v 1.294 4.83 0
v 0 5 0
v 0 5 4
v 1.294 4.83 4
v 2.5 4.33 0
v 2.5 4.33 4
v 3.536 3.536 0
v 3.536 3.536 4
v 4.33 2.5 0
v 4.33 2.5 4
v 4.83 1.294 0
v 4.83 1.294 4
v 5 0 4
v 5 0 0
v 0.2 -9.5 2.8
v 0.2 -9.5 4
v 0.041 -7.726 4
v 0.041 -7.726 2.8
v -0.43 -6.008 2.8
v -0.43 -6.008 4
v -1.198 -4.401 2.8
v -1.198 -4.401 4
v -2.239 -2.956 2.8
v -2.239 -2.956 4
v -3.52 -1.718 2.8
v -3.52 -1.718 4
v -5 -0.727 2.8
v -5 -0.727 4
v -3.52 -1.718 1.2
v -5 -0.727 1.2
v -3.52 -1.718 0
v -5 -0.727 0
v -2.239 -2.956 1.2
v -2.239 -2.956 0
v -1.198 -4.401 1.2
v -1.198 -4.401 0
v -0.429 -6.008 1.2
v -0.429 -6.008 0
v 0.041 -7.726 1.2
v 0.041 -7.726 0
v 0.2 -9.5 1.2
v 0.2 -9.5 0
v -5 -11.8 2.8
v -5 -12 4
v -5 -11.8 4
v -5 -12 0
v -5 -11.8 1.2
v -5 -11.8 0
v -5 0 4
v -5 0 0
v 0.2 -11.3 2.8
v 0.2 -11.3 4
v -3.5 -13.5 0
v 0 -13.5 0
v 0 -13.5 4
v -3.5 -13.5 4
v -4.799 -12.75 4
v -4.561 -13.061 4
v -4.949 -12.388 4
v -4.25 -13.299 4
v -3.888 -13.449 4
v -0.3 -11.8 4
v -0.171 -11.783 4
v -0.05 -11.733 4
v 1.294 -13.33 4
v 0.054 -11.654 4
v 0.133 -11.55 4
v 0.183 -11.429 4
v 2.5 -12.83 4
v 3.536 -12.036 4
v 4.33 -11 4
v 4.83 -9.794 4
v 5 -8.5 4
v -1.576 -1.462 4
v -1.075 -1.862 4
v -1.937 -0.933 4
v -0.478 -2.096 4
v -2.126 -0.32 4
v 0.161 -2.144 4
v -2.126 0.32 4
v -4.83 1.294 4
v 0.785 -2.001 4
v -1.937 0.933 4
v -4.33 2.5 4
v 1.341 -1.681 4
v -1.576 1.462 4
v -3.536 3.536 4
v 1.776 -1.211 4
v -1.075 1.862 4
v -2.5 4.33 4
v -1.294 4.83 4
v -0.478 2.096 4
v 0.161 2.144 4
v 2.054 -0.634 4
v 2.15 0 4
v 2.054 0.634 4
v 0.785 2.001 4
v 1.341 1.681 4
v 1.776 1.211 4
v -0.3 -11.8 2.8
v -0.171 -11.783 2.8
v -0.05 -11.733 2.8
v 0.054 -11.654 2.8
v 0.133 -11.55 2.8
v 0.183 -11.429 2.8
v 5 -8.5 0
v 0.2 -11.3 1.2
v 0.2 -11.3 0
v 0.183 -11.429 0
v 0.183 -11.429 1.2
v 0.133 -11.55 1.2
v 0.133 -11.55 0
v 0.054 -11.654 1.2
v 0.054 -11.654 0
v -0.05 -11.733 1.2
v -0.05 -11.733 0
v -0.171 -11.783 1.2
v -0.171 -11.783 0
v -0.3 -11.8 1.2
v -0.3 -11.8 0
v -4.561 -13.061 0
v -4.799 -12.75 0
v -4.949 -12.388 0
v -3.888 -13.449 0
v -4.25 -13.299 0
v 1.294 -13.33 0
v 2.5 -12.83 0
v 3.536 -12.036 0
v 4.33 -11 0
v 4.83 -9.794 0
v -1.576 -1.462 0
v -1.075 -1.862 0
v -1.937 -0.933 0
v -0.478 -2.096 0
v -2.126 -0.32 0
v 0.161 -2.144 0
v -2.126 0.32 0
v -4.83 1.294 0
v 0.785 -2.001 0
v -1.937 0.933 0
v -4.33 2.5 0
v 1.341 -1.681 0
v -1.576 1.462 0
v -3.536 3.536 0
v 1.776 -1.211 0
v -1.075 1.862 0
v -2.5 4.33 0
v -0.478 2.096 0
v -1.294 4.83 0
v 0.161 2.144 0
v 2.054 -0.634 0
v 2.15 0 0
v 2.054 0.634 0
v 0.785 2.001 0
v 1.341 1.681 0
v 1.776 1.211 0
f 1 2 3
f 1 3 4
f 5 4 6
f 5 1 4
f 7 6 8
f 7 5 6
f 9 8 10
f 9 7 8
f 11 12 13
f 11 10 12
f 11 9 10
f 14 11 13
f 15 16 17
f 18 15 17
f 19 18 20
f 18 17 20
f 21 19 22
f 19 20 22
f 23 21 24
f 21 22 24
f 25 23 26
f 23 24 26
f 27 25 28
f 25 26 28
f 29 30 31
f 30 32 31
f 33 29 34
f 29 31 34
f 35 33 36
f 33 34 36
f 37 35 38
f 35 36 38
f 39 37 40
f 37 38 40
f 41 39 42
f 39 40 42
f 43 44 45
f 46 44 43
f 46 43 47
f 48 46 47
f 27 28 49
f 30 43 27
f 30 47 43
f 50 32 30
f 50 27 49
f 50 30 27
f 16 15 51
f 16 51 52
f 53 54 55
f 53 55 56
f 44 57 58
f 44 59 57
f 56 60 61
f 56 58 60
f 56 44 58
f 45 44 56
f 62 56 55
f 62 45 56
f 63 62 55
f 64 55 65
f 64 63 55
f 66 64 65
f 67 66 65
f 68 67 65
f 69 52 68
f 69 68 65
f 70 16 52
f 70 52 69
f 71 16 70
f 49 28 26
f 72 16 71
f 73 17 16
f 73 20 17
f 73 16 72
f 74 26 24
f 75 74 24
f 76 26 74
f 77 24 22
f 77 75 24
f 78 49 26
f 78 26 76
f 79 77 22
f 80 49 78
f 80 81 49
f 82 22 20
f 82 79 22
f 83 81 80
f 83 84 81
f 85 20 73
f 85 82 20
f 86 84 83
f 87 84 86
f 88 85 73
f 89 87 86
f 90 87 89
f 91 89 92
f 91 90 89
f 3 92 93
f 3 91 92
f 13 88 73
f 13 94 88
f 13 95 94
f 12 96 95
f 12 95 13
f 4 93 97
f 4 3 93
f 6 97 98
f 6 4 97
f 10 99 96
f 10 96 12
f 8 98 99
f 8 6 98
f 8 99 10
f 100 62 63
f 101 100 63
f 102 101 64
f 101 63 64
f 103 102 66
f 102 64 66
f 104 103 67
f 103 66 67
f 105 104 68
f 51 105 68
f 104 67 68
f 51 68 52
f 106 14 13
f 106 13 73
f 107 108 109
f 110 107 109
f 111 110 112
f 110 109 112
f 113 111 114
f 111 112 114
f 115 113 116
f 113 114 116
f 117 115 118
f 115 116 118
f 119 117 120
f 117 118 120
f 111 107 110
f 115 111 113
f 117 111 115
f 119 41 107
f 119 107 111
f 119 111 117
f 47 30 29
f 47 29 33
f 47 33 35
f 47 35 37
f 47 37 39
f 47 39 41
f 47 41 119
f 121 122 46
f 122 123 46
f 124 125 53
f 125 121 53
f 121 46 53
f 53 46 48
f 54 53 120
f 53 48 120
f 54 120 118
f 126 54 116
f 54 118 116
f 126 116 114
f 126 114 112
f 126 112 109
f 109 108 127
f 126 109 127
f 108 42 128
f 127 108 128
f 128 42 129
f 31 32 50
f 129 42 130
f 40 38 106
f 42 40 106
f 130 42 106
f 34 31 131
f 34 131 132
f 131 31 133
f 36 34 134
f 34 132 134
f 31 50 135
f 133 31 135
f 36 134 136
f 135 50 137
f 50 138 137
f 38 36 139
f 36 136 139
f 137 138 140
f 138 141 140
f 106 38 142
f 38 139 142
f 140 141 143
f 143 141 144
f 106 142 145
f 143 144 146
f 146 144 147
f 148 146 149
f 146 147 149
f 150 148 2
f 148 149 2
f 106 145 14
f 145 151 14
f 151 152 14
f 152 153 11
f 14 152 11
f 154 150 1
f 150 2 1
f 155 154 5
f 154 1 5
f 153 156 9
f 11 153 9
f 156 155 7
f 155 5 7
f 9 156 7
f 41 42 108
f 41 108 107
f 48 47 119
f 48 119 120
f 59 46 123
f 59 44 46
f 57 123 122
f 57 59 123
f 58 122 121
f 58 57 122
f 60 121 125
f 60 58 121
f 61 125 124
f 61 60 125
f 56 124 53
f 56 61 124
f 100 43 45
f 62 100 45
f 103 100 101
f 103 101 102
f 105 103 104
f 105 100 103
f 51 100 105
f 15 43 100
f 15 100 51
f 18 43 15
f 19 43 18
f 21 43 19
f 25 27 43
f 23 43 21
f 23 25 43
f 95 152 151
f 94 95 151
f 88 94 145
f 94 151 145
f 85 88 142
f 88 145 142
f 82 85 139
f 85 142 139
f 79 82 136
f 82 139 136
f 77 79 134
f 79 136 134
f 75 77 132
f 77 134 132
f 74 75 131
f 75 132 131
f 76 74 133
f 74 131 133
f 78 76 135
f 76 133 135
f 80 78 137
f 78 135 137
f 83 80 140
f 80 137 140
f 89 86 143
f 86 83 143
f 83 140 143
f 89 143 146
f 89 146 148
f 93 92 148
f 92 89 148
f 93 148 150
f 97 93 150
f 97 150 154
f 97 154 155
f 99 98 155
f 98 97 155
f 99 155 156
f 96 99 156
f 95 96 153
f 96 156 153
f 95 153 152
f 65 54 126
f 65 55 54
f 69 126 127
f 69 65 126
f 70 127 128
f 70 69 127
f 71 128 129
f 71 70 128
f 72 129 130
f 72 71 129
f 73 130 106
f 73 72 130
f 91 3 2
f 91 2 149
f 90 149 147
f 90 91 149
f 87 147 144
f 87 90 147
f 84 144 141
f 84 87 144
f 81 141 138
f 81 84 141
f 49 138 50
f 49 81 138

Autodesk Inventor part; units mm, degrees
ref_plane "YZ Plane" through (0, 0, 0) normal (1, 0, 0) x (0, 1, 0)
ref_plane "XZ Plane" through (0, 0, 0) normal (0, 1, 0) x (-1, 0, 0)
ref_plane "XY Plane" through (0, 0, 0) normal (0, 0, 1) x (1, 0, 0)
sketch "Boceto39" plane through (0, 0, 0) normal (0, 0, 1) x (1, 0, 0)
  circle A0 centre (0, 0) radius 2.15
  line L0 (-5, 5) -> (0, 5)
  line L1 (5, 0) -> (5, -13.5)
  line L2 (5, -13.5) -> (-5, -13.5)
  line L3 (-5, -13.5) -> (-5, 5)
  arc A1 (5, 0) -> (0, 5) centre (0, 0) ccw
  dimension "d373" = 4.3
  dimension "d374" = 5
  dimension "d375" = 10
  dimension "d376" = 18.5
extrude "Extrusión13" add sketch "Boceto39" along normal blind 4
sketch "Boceto40" plane through (-5, -13.5, 0) normal (-1, 0, 0) x (0, 0, 1)
  line L0 (0, 0) -> (0, 18.5) construction
  line L1 (0, 0) -> (4, 0) construction
  line L2 (4, 18.5) -> (4, 0) construction
  line L3 (0, 18.5) -> (4, 18.5) construction
  line L4 (0, 4) -> (1.2, 4)
  line L5 (1.2, 4) -> (1.2, 1.7)
  line L6 (1.2, 1.7) -> (0, 1.7)
  line L7 (0, 1.7) -> (0, 4)
  line L8 (4, 18.5) -> (4, 0) projected
  line L9 (4, 4) -> (2.8, 4)
  line L10 (2.8, 4) -> (2.8, 1.7)
  line L11 (2.8, 1.7) -> (4, 1.7)
  line L12 (4, 1.7) -> (4, 4)
  point P0 (0, 13.5)
  dimension "d379" = 1.7
  dimension "d380" = 2.3
  dimension "d381" = 1.2
extrude "Extrusión14" cut sketch "Boceto40" against normal blind 5.2
sketch "Boceto41" plane through (0, 0, 0) normal (0, 0, -1) x (-1, 0, 0)
  line L0 (-0.2, -11.8) -> (-0.2, -9.5) construction
  line L1 (5, -9.5) -> (5, 5) construction
  arc A0 (5, -0.7273) -> (-0.2, -9.5) centre (9.8, -9.5) ccw
  line L2 (5, 5) -> (5, -9.5) construction
  line L3 (-0.2, -9.5) -> (5, -9.5)
  line L4 (5, -9.5) -> (5, -0.7273)
  point P0 (0, 0)
  dimension "d384" = 10
extrude "Extrusión15" cut sketch "Boceto41" against normal up to surface (1.2 mm away)
sketch "Boceto42" plane through (0, 0, 4) normal (0, 0, 1) x (1, 0, 0)
  line L0 (-5, -9.5) -> (0.2, -9.5) projected
  line L1 (0.2, -9.5) -> (0.2, -11.8) construction
  line L2 (0.2, -11.8) -> (-5, -11.8) construction
  line L3 (-5, -11.8) -> (-5, -13.5) construction
  line L4 (-5, -13.5) -> (5, -13.5) construction
  line L5 (5, -13.5) -> (5, 0) construction
  arc A0 (5, 0) -> (0, 5) centre (0, 0) ccw construction
  line L6 (0, 5) -> (-5, 5) construction
  line L7 (-5, 5) -> (-5, -9.5) construction
  circle A1 centre (0, 0) radius 2.15 construction
  line L8 (-5, -0.7273) -> (-5, -11.8) construction
  arc A2 (0.2, -9.5) -> (-5, -0.7273) centre (-9.8, -9.5) ccw projected
  line L9 (0.2, -9.5) -> (0.2, -11.8) construction
  line L10 (-5, -11.8) -> (0.2, -11.8) construction
  line L11 (-5, -11.8) -> (-5, -9.5) projected
  line L12 (-5, -9.5) -> (-5, -0.7273)
  line L13 (-5, -9.5) -> (0.2, -9.5) projected
  line L14 (-5, -9.5) -> (0.2, -9.5)
  line L15 (0.2, -9.5) -> (0.2, -11.8) projected
  line L16 (-5, -0.7273) -> (-5, -11.8) projected
  arc A3 (0.2, -9.5) -> (-5, -0.7273) centre (-9.8, -9.5) ccw
extrude "Extrusión16" cut sketch "Boceto42" against normal up to surface (1.2 mm away)
fillet "Empalme44" radius 5 1 edges at (-5, 5, 2)
fillet "Empalme45" radius 5 1 edges at (5, -13.5, 2)
fillet "Empalme46" radius 1.5 1 edges at (-5, -13.5, 2)
fillet "Empalme46" radius 0.5 2 edges at (0.2, -11.8, 0.6) (0.2, -11.8, 3.4)
properties part number "PP-I3D-0001"
